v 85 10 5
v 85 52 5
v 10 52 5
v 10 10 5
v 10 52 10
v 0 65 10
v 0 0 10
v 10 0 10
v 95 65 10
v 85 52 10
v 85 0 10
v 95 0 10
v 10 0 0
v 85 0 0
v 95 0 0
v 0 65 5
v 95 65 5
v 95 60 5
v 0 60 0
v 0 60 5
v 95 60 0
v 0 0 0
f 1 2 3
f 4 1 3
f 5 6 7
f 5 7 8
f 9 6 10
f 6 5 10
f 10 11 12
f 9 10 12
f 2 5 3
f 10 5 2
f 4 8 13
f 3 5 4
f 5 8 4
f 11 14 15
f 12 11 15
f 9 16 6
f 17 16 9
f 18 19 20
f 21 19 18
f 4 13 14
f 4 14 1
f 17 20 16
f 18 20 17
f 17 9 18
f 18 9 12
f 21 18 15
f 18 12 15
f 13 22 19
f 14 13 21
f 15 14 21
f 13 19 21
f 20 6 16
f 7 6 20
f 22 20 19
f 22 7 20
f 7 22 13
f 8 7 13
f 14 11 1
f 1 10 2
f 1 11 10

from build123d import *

# Parameters (mm, degrees)
SKETCH1_W           = 95
SKETCH1_H           = 60
BOSS_EXTRUDE1_DEPTH = 10
CUT_EXTRUDE1_DEPTH  = 5
CUT_EXTRUDE2_DEPTH  = 75
SKETCH7_W           = 95
SKETCH7_H           = 5
BOSS_EXTRUDE3_DEPTH = 5


with BuildPart() as part:
    # Sketch1 → Boss-Extrude1 (new body)
    with BuildSketch(Plane.XY):
        with Locations((47.5, 30)):
            Rectangle(SKETCH1_W, SKETCH1_H)
    extrude(amount=BOSS_EXTRUDE1_DEPTH)

    # Sketch2 → Cut-Extrude1 (cut)
    with BuildSketch(Plane.XY.offset(10)):
        Polygon((10, 50), (10, 52), (85, 52), (85, 50), (85, 10), (10, 10), align=None)
    extrude(amount=-CUT_EXTRUDE1_DEPTH, mode=Mode.SUBTRACT)

    # Sketch4 → Cut-Extrude2 (cut)
    with BuildSketch(Plane(origin=(10, 0, 0), x_dir=(0, 0, -1), z_dir=(1, 0, 0))):
        Polygon((0, 0), (-5, 10), (-10, 10), (-10, 0), align=None)
    extrude(amount=CUT_EXTRUDE2_DEPTH, mode=Mode.SUBTRACT)

    # Sketch7 → Boss-Extrude3 (add)
    with BuildSketch(Plane(origin=(0, 60, 0), x_dir=(1, 0, 0), z_dir=(0, 1, 0))):
        with Locations((47.5, -7.5)):
            Rectangle(SKETCH7_W, SKETCH7_H)
    extrude(amount=BOSS_EXTRUDE3_DEPTH)


solid = part.part
